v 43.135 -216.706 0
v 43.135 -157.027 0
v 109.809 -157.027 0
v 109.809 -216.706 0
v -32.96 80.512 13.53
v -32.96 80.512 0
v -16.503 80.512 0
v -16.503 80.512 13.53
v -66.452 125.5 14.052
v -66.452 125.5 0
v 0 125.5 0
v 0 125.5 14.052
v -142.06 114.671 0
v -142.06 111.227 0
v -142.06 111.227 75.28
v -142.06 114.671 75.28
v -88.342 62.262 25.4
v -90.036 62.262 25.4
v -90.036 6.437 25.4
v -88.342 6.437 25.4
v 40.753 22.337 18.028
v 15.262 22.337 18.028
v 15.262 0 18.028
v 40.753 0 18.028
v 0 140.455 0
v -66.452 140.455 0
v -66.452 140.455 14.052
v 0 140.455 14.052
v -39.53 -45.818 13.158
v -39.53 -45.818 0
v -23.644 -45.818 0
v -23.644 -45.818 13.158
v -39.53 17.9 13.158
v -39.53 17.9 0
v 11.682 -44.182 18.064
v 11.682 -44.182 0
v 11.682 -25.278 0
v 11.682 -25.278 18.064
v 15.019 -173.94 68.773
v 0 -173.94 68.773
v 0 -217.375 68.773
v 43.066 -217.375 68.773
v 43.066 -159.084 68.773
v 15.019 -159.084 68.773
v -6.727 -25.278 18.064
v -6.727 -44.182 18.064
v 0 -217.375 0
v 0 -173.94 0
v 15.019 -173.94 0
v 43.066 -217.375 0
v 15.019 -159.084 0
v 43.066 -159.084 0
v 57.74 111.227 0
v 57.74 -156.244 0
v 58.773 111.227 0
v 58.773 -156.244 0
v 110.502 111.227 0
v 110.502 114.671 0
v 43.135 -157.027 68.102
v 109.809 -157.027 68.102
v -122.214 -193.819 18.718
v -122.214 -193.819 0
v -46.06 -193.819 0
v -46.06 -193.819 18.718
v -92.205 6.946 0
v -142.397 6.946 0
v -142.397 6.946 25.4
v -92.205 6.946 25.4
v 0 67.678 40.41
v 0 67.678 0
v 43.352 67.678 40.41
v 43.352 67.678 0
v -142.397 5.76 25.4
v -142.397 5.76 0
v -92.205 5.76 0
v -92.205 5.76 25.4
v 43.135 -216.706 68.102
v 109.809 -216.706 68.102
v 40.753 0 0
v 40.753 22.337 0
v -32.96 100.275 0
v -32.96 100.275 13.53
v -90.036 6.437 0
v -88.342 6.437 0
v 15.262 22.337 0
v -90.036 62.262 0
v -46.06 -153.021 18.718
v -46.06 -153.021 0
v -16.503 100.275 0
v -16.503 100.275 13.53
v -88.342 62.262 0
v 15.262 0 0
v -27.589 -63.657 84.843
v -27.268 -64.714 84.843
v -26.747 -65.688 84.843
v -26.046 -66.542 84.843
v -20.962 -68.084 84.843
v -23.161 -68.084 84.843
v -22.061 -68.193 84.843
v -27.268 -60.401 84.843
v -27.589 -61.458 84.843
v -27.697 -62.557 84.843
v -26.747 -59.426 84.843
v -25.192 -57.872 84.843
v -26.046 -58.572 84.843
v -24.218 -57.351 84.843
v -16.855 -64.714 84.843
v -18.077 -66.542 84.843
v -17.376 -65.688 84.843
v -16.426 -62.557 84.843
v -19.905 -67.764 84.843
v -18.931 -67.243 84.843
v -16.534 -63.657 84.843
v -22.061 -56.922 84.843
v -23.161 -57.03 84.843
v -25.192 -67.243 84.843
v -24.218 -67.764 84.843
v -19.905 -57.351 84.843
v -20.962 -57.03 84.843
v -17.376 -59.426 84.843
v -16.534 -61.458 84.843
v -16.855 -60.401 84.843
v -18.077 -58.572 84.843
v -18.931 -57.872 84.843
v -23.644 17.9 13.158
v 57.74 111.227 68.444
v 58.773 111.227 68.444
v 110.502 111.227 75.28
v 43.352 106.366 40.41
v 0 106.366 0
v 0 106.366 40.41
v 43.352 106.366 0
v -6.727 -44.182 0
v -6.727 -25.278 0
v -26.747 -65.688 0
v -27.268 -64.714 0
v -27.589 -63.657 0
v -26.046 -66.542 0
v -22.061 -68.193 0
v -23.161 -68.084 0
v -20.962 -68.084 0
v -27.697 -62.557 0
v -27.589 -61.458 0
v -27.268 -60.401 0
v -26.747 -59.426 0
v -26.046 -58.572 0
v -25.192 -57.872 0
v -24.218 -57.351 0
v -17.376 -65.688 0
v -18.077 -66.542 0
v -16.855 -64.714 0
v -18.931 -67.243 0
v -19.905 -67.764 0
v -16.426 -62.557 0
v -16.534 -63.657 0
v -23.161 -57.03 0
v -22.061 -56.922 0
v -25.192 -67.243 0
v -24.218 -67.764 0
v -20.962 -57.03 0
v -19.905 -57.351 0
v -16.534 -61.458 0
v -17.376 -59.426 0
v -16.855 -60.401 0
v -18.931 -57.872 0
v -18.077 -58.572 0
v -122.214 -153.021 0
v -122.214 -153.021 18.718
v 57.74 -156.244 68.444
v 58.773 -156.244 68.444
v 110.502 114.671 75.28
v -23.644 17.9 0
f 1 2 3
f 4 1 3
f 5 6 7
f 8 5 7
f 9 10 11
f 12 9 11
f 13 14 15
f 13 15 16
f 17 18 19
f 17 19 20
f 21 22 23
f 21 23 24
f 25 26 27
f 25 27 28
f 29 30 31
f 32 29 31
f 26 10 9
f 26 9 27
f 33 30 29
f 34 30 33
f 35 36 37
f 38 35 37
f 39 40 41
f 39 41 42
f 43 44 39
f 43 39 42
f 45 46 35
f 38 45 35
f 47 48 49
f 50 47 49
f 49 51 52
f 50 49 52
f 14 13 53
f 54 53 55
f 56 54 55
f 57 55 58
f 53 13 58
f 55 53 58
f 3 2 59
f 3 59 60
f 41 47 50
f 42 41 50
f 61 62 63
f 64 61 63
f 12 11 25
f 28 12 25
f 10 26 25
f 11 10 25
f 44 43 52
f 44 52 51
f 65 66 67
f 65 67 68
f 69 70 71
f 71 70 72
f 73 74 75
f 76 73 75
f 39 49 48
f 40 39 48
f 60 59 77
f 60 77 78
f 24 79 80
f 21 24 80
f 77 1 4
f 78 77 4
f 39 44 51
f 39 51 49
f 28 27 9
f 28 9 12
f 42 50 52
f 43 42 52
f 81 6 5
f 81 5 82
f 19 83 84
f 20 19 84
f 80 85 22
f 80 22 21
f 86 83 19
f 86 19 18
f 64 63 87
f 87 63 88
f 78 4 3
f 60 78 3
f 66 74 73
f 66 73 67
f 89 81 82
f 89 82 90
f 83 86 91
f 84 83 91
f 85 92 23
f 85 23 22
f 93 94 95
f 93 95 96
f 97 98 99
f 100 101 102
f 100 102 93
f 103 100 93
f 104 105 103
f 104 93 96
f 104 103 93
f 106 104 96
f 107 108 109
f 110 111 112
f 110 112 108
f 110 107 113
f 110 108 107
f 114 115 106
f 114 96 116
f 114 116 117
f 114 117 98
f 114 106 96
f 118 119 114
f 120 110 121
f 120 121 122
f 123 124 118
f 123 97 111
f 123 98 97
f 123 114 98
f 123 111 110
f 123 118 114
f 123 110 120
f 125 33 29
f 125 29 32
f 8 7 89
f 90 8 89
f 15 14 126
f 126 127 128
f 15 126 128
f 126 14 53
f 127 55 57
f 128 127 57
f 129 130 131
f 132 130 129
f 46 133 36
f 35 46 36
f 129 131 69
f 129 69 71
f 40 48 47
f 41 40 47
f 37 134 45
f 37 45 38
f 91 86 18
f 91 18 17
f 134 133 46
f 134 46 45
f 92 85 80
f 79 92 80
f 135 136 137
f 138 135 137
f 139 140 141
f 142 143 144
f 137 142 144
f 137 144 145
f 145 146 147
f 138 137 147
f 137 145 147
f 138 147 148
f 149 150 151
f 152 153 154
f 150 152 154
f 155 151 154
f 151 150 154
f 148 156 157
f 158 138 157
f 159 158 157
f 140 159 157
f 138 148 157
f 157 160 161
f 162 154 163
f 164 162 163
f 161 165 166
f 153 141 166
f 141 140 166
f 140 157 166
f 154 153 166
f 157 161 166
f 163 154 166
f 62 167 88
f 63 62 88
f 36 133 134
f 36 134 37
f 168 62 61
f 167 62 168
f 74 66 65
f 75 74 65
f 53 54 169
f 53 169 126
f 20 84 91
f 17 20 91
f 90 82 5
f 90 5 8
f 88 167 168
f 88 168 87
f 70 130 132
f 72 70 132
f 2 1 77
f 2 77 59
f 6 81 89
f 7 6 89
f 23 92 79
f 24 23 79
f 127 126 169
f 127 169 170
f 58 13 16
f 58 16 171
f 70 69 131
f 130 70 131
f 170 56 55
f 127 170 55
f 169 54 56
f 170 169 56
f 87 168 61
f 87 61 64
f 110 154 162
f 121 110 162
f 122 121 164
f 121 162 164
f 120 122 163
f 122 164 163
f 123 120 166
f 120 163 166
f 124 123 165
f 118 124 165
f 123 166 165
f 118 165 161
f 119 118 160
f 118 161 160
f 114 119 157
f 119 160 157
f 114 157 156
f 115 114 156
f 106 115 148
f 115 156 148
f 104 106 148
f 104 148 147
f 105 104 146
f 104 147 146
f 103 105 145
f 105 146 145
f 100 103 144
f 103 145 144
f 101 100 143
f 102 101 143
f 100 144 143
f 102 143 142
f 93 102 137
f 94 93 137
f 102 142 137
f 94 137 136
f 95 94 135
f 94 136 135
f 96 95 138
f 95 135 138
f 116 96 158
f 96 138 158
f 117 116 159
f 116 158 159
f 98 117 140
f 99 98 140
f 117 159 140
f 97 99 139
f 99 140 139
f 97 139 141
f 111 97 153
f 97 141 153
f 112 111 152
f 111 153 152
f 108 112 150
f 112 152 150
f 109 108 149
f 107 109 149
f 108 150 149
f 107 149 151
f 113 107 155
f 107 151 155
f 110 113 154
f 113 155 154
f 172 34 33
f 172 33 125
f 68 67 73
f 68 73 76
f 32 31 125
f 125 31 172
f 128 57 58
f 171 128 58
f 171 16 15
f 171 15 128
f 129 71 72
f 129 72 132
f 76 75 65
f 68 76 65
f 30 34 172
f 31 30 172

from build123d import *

# Parameters (mm, degrees)
F1_DEPTH  = 68.77318
F2_W      = 66.673864
F2_H      = 59.678898
F3_DEPTH  = 68.10231
F4_W      = 76.154269
F4_H      = 40.798098
F5_DEPTH  = 18.71756
F6_W      = 15.885625
F6_H      = 63.718282
F7_DEPTH  = 13.15756
F8_W      = 18.40895
F8_H      = 18.904217
F9_DEPTH  = 18.06381
F10_W     = 43.351732
F10_H     = 38.688205
F11_DEPTH = 40.41022
F12_W     = 16.457217
F12_H     = 19.763306
F13_DEPTH = 13.52968
F14_W     = 66.45219
F14_H     = 14.955505
F15_DEPTH = 14.05186
F16_W     = 25.491005
F16_H     = 22.336919
F17_DEPTH = 18.02762
F18_W     = 50.191917
F18_H     = 1.185694
F19_DEPTH = 25.4
F20_W     = 1.693874
F20_H     = 55.824861
F21_DEPTH = 25.4
F22_W     = 252.562791
F22_H     = 3.443681
F23_DEPTH = 75.27987
F25_W     = 1.032367
F25_H     = 268.537067
F26_DEPTH = 68.44399
F27_R     = 5.635424
F28_DEPTH = 84.84251


with BuildPart() as f1:
    # F0 (on Top) → F1 (new body)
    with BuildSketch(Plane.XY):
        Polygon((43.065939, -217.374682), (43.065939, -214.579239), (43.065939, -159.084097), (15.019242, -159.084097), (15.019242, -173.939615), (0, -173.939615), (0, -217.374682), align=None)
    extrude(amount=F1_DEPTH)


with BuildPart() as f3:
    # F2 (on Top) → F3 (new body)
    with BuildSketch(Plane.XY):
        with Locations((76.472385, -186.866887)):
            Rectangle(F2_W, F2_H)
    extrude(amount=F3_DEPTH)


with BuildPart() as f5:
    # F4 (on Top) → F5 (new body)
    with BuildSketch(Plane.XY):
        with Locations((-84.136653, -173.41961)):
            Rectangle(F4_W, F4_H)
    extrude(amount=F5_DEPTH)


with BuildPart() as f7:
    # F6 (on Top) → F7 (new body)
    with BuildSketch(Plane.XY):
        with Locations((-31.587196, -13.958752)):
            Rectangle(F6_W, F6_H)
    extrude(amount=F7_DEPTH)


with BuildPart() as f9:
    # F8 (on Top) → F9 (new body)
    with BuildSketch(Plane.XY):
        with Locations((2.47772, -34.730367)):
            Rectangle(F8_W, F8_H)
    extrude(amount=F9_DEPTH)


with BuildPart() as f11:
    # F10 (on Top) → F11 (new body)
    with BuildSketch(Plane.XY):
        with Locations((21.675866, 87.022063)):
            Rectangle(F10_W, F10_H)
    extrude(amount=F11_DEPTH)


with BuildPart() as f13:
    # F12 (on Top) → F13 (new body)
    with BuildSketch(Plane.XY):
        with Locations((-24.731489, 90.393826)):
            Rectangle(F12_W, F12_H)
    extrude(amount=F13_DEPTH)


with BuildPart() as f15:
    # F14 (on Top) → F15 (new body)
    with BuildSketch(Plane.XY):
        with Locations((-33.226095, 132.977598)):
            Rectangle(F14_W, F14_H)
    extrude(amount=F15_DEPTH)


with BuildPart() as f17:
    # F16 (on Top) → F17 (new body)
    with BuildSketch(Plane.XY):
        with Locations((28.0079, 11.168459)):
            Rectangle(F16_W, F16_H)
    extrude(amount=F17_DEPTH)


with BuildPart() as f19:
    # F18 (on Top) → F19 (new body)
    with BuildSketch(Plane.XY):
        with Locations((-117.300849, 6.352884)):
            Rectangle(F18_W, F18_H)
    extrude(amount=F19_DEPTH)


with BuildPart() as f21:
    # F20 (on Top) → F21 (new body)
    with BuildSketch(Plane.XY):
        with Locations((-89.188963, 34.349404)):
            Rectangle(F20_W, F20_H)
    extrude(amount=F21_DEPTH)


with BuildPart() as f23:
    # F22 (on Top) → F23 (new body)
    with BuildSketch(Plane.XY):
        with Locations((-15.778958, 112.948957)):
            Rectangle(F22_W, F22_H)
    extrude(amount=F23_DEPTH)

    # F25 (on Top) → F26 (join)
    with BuildSketch(Plane.XY):
        with Locations((58.256366, -21.975432)):
            Rectangle(F25_W, F25_H)
    extrude(amount=F26_DEPTH)


with BuildPart() as f28:
    # F27 (on Top) → F28 (new body)
    with BuildSketch(Plane.XY):
        with Locations((-22.06143, -62.55731)):
            Circle(F27_R)
    extrude(amount=F28_DEPTH)


solid = Compound([f1.part, f3.part, f5.part, f7.part, f9.part, f11.part, f13.part, f15.part, f17.part, f19.part, f21.part, f23.part, f28.part])
